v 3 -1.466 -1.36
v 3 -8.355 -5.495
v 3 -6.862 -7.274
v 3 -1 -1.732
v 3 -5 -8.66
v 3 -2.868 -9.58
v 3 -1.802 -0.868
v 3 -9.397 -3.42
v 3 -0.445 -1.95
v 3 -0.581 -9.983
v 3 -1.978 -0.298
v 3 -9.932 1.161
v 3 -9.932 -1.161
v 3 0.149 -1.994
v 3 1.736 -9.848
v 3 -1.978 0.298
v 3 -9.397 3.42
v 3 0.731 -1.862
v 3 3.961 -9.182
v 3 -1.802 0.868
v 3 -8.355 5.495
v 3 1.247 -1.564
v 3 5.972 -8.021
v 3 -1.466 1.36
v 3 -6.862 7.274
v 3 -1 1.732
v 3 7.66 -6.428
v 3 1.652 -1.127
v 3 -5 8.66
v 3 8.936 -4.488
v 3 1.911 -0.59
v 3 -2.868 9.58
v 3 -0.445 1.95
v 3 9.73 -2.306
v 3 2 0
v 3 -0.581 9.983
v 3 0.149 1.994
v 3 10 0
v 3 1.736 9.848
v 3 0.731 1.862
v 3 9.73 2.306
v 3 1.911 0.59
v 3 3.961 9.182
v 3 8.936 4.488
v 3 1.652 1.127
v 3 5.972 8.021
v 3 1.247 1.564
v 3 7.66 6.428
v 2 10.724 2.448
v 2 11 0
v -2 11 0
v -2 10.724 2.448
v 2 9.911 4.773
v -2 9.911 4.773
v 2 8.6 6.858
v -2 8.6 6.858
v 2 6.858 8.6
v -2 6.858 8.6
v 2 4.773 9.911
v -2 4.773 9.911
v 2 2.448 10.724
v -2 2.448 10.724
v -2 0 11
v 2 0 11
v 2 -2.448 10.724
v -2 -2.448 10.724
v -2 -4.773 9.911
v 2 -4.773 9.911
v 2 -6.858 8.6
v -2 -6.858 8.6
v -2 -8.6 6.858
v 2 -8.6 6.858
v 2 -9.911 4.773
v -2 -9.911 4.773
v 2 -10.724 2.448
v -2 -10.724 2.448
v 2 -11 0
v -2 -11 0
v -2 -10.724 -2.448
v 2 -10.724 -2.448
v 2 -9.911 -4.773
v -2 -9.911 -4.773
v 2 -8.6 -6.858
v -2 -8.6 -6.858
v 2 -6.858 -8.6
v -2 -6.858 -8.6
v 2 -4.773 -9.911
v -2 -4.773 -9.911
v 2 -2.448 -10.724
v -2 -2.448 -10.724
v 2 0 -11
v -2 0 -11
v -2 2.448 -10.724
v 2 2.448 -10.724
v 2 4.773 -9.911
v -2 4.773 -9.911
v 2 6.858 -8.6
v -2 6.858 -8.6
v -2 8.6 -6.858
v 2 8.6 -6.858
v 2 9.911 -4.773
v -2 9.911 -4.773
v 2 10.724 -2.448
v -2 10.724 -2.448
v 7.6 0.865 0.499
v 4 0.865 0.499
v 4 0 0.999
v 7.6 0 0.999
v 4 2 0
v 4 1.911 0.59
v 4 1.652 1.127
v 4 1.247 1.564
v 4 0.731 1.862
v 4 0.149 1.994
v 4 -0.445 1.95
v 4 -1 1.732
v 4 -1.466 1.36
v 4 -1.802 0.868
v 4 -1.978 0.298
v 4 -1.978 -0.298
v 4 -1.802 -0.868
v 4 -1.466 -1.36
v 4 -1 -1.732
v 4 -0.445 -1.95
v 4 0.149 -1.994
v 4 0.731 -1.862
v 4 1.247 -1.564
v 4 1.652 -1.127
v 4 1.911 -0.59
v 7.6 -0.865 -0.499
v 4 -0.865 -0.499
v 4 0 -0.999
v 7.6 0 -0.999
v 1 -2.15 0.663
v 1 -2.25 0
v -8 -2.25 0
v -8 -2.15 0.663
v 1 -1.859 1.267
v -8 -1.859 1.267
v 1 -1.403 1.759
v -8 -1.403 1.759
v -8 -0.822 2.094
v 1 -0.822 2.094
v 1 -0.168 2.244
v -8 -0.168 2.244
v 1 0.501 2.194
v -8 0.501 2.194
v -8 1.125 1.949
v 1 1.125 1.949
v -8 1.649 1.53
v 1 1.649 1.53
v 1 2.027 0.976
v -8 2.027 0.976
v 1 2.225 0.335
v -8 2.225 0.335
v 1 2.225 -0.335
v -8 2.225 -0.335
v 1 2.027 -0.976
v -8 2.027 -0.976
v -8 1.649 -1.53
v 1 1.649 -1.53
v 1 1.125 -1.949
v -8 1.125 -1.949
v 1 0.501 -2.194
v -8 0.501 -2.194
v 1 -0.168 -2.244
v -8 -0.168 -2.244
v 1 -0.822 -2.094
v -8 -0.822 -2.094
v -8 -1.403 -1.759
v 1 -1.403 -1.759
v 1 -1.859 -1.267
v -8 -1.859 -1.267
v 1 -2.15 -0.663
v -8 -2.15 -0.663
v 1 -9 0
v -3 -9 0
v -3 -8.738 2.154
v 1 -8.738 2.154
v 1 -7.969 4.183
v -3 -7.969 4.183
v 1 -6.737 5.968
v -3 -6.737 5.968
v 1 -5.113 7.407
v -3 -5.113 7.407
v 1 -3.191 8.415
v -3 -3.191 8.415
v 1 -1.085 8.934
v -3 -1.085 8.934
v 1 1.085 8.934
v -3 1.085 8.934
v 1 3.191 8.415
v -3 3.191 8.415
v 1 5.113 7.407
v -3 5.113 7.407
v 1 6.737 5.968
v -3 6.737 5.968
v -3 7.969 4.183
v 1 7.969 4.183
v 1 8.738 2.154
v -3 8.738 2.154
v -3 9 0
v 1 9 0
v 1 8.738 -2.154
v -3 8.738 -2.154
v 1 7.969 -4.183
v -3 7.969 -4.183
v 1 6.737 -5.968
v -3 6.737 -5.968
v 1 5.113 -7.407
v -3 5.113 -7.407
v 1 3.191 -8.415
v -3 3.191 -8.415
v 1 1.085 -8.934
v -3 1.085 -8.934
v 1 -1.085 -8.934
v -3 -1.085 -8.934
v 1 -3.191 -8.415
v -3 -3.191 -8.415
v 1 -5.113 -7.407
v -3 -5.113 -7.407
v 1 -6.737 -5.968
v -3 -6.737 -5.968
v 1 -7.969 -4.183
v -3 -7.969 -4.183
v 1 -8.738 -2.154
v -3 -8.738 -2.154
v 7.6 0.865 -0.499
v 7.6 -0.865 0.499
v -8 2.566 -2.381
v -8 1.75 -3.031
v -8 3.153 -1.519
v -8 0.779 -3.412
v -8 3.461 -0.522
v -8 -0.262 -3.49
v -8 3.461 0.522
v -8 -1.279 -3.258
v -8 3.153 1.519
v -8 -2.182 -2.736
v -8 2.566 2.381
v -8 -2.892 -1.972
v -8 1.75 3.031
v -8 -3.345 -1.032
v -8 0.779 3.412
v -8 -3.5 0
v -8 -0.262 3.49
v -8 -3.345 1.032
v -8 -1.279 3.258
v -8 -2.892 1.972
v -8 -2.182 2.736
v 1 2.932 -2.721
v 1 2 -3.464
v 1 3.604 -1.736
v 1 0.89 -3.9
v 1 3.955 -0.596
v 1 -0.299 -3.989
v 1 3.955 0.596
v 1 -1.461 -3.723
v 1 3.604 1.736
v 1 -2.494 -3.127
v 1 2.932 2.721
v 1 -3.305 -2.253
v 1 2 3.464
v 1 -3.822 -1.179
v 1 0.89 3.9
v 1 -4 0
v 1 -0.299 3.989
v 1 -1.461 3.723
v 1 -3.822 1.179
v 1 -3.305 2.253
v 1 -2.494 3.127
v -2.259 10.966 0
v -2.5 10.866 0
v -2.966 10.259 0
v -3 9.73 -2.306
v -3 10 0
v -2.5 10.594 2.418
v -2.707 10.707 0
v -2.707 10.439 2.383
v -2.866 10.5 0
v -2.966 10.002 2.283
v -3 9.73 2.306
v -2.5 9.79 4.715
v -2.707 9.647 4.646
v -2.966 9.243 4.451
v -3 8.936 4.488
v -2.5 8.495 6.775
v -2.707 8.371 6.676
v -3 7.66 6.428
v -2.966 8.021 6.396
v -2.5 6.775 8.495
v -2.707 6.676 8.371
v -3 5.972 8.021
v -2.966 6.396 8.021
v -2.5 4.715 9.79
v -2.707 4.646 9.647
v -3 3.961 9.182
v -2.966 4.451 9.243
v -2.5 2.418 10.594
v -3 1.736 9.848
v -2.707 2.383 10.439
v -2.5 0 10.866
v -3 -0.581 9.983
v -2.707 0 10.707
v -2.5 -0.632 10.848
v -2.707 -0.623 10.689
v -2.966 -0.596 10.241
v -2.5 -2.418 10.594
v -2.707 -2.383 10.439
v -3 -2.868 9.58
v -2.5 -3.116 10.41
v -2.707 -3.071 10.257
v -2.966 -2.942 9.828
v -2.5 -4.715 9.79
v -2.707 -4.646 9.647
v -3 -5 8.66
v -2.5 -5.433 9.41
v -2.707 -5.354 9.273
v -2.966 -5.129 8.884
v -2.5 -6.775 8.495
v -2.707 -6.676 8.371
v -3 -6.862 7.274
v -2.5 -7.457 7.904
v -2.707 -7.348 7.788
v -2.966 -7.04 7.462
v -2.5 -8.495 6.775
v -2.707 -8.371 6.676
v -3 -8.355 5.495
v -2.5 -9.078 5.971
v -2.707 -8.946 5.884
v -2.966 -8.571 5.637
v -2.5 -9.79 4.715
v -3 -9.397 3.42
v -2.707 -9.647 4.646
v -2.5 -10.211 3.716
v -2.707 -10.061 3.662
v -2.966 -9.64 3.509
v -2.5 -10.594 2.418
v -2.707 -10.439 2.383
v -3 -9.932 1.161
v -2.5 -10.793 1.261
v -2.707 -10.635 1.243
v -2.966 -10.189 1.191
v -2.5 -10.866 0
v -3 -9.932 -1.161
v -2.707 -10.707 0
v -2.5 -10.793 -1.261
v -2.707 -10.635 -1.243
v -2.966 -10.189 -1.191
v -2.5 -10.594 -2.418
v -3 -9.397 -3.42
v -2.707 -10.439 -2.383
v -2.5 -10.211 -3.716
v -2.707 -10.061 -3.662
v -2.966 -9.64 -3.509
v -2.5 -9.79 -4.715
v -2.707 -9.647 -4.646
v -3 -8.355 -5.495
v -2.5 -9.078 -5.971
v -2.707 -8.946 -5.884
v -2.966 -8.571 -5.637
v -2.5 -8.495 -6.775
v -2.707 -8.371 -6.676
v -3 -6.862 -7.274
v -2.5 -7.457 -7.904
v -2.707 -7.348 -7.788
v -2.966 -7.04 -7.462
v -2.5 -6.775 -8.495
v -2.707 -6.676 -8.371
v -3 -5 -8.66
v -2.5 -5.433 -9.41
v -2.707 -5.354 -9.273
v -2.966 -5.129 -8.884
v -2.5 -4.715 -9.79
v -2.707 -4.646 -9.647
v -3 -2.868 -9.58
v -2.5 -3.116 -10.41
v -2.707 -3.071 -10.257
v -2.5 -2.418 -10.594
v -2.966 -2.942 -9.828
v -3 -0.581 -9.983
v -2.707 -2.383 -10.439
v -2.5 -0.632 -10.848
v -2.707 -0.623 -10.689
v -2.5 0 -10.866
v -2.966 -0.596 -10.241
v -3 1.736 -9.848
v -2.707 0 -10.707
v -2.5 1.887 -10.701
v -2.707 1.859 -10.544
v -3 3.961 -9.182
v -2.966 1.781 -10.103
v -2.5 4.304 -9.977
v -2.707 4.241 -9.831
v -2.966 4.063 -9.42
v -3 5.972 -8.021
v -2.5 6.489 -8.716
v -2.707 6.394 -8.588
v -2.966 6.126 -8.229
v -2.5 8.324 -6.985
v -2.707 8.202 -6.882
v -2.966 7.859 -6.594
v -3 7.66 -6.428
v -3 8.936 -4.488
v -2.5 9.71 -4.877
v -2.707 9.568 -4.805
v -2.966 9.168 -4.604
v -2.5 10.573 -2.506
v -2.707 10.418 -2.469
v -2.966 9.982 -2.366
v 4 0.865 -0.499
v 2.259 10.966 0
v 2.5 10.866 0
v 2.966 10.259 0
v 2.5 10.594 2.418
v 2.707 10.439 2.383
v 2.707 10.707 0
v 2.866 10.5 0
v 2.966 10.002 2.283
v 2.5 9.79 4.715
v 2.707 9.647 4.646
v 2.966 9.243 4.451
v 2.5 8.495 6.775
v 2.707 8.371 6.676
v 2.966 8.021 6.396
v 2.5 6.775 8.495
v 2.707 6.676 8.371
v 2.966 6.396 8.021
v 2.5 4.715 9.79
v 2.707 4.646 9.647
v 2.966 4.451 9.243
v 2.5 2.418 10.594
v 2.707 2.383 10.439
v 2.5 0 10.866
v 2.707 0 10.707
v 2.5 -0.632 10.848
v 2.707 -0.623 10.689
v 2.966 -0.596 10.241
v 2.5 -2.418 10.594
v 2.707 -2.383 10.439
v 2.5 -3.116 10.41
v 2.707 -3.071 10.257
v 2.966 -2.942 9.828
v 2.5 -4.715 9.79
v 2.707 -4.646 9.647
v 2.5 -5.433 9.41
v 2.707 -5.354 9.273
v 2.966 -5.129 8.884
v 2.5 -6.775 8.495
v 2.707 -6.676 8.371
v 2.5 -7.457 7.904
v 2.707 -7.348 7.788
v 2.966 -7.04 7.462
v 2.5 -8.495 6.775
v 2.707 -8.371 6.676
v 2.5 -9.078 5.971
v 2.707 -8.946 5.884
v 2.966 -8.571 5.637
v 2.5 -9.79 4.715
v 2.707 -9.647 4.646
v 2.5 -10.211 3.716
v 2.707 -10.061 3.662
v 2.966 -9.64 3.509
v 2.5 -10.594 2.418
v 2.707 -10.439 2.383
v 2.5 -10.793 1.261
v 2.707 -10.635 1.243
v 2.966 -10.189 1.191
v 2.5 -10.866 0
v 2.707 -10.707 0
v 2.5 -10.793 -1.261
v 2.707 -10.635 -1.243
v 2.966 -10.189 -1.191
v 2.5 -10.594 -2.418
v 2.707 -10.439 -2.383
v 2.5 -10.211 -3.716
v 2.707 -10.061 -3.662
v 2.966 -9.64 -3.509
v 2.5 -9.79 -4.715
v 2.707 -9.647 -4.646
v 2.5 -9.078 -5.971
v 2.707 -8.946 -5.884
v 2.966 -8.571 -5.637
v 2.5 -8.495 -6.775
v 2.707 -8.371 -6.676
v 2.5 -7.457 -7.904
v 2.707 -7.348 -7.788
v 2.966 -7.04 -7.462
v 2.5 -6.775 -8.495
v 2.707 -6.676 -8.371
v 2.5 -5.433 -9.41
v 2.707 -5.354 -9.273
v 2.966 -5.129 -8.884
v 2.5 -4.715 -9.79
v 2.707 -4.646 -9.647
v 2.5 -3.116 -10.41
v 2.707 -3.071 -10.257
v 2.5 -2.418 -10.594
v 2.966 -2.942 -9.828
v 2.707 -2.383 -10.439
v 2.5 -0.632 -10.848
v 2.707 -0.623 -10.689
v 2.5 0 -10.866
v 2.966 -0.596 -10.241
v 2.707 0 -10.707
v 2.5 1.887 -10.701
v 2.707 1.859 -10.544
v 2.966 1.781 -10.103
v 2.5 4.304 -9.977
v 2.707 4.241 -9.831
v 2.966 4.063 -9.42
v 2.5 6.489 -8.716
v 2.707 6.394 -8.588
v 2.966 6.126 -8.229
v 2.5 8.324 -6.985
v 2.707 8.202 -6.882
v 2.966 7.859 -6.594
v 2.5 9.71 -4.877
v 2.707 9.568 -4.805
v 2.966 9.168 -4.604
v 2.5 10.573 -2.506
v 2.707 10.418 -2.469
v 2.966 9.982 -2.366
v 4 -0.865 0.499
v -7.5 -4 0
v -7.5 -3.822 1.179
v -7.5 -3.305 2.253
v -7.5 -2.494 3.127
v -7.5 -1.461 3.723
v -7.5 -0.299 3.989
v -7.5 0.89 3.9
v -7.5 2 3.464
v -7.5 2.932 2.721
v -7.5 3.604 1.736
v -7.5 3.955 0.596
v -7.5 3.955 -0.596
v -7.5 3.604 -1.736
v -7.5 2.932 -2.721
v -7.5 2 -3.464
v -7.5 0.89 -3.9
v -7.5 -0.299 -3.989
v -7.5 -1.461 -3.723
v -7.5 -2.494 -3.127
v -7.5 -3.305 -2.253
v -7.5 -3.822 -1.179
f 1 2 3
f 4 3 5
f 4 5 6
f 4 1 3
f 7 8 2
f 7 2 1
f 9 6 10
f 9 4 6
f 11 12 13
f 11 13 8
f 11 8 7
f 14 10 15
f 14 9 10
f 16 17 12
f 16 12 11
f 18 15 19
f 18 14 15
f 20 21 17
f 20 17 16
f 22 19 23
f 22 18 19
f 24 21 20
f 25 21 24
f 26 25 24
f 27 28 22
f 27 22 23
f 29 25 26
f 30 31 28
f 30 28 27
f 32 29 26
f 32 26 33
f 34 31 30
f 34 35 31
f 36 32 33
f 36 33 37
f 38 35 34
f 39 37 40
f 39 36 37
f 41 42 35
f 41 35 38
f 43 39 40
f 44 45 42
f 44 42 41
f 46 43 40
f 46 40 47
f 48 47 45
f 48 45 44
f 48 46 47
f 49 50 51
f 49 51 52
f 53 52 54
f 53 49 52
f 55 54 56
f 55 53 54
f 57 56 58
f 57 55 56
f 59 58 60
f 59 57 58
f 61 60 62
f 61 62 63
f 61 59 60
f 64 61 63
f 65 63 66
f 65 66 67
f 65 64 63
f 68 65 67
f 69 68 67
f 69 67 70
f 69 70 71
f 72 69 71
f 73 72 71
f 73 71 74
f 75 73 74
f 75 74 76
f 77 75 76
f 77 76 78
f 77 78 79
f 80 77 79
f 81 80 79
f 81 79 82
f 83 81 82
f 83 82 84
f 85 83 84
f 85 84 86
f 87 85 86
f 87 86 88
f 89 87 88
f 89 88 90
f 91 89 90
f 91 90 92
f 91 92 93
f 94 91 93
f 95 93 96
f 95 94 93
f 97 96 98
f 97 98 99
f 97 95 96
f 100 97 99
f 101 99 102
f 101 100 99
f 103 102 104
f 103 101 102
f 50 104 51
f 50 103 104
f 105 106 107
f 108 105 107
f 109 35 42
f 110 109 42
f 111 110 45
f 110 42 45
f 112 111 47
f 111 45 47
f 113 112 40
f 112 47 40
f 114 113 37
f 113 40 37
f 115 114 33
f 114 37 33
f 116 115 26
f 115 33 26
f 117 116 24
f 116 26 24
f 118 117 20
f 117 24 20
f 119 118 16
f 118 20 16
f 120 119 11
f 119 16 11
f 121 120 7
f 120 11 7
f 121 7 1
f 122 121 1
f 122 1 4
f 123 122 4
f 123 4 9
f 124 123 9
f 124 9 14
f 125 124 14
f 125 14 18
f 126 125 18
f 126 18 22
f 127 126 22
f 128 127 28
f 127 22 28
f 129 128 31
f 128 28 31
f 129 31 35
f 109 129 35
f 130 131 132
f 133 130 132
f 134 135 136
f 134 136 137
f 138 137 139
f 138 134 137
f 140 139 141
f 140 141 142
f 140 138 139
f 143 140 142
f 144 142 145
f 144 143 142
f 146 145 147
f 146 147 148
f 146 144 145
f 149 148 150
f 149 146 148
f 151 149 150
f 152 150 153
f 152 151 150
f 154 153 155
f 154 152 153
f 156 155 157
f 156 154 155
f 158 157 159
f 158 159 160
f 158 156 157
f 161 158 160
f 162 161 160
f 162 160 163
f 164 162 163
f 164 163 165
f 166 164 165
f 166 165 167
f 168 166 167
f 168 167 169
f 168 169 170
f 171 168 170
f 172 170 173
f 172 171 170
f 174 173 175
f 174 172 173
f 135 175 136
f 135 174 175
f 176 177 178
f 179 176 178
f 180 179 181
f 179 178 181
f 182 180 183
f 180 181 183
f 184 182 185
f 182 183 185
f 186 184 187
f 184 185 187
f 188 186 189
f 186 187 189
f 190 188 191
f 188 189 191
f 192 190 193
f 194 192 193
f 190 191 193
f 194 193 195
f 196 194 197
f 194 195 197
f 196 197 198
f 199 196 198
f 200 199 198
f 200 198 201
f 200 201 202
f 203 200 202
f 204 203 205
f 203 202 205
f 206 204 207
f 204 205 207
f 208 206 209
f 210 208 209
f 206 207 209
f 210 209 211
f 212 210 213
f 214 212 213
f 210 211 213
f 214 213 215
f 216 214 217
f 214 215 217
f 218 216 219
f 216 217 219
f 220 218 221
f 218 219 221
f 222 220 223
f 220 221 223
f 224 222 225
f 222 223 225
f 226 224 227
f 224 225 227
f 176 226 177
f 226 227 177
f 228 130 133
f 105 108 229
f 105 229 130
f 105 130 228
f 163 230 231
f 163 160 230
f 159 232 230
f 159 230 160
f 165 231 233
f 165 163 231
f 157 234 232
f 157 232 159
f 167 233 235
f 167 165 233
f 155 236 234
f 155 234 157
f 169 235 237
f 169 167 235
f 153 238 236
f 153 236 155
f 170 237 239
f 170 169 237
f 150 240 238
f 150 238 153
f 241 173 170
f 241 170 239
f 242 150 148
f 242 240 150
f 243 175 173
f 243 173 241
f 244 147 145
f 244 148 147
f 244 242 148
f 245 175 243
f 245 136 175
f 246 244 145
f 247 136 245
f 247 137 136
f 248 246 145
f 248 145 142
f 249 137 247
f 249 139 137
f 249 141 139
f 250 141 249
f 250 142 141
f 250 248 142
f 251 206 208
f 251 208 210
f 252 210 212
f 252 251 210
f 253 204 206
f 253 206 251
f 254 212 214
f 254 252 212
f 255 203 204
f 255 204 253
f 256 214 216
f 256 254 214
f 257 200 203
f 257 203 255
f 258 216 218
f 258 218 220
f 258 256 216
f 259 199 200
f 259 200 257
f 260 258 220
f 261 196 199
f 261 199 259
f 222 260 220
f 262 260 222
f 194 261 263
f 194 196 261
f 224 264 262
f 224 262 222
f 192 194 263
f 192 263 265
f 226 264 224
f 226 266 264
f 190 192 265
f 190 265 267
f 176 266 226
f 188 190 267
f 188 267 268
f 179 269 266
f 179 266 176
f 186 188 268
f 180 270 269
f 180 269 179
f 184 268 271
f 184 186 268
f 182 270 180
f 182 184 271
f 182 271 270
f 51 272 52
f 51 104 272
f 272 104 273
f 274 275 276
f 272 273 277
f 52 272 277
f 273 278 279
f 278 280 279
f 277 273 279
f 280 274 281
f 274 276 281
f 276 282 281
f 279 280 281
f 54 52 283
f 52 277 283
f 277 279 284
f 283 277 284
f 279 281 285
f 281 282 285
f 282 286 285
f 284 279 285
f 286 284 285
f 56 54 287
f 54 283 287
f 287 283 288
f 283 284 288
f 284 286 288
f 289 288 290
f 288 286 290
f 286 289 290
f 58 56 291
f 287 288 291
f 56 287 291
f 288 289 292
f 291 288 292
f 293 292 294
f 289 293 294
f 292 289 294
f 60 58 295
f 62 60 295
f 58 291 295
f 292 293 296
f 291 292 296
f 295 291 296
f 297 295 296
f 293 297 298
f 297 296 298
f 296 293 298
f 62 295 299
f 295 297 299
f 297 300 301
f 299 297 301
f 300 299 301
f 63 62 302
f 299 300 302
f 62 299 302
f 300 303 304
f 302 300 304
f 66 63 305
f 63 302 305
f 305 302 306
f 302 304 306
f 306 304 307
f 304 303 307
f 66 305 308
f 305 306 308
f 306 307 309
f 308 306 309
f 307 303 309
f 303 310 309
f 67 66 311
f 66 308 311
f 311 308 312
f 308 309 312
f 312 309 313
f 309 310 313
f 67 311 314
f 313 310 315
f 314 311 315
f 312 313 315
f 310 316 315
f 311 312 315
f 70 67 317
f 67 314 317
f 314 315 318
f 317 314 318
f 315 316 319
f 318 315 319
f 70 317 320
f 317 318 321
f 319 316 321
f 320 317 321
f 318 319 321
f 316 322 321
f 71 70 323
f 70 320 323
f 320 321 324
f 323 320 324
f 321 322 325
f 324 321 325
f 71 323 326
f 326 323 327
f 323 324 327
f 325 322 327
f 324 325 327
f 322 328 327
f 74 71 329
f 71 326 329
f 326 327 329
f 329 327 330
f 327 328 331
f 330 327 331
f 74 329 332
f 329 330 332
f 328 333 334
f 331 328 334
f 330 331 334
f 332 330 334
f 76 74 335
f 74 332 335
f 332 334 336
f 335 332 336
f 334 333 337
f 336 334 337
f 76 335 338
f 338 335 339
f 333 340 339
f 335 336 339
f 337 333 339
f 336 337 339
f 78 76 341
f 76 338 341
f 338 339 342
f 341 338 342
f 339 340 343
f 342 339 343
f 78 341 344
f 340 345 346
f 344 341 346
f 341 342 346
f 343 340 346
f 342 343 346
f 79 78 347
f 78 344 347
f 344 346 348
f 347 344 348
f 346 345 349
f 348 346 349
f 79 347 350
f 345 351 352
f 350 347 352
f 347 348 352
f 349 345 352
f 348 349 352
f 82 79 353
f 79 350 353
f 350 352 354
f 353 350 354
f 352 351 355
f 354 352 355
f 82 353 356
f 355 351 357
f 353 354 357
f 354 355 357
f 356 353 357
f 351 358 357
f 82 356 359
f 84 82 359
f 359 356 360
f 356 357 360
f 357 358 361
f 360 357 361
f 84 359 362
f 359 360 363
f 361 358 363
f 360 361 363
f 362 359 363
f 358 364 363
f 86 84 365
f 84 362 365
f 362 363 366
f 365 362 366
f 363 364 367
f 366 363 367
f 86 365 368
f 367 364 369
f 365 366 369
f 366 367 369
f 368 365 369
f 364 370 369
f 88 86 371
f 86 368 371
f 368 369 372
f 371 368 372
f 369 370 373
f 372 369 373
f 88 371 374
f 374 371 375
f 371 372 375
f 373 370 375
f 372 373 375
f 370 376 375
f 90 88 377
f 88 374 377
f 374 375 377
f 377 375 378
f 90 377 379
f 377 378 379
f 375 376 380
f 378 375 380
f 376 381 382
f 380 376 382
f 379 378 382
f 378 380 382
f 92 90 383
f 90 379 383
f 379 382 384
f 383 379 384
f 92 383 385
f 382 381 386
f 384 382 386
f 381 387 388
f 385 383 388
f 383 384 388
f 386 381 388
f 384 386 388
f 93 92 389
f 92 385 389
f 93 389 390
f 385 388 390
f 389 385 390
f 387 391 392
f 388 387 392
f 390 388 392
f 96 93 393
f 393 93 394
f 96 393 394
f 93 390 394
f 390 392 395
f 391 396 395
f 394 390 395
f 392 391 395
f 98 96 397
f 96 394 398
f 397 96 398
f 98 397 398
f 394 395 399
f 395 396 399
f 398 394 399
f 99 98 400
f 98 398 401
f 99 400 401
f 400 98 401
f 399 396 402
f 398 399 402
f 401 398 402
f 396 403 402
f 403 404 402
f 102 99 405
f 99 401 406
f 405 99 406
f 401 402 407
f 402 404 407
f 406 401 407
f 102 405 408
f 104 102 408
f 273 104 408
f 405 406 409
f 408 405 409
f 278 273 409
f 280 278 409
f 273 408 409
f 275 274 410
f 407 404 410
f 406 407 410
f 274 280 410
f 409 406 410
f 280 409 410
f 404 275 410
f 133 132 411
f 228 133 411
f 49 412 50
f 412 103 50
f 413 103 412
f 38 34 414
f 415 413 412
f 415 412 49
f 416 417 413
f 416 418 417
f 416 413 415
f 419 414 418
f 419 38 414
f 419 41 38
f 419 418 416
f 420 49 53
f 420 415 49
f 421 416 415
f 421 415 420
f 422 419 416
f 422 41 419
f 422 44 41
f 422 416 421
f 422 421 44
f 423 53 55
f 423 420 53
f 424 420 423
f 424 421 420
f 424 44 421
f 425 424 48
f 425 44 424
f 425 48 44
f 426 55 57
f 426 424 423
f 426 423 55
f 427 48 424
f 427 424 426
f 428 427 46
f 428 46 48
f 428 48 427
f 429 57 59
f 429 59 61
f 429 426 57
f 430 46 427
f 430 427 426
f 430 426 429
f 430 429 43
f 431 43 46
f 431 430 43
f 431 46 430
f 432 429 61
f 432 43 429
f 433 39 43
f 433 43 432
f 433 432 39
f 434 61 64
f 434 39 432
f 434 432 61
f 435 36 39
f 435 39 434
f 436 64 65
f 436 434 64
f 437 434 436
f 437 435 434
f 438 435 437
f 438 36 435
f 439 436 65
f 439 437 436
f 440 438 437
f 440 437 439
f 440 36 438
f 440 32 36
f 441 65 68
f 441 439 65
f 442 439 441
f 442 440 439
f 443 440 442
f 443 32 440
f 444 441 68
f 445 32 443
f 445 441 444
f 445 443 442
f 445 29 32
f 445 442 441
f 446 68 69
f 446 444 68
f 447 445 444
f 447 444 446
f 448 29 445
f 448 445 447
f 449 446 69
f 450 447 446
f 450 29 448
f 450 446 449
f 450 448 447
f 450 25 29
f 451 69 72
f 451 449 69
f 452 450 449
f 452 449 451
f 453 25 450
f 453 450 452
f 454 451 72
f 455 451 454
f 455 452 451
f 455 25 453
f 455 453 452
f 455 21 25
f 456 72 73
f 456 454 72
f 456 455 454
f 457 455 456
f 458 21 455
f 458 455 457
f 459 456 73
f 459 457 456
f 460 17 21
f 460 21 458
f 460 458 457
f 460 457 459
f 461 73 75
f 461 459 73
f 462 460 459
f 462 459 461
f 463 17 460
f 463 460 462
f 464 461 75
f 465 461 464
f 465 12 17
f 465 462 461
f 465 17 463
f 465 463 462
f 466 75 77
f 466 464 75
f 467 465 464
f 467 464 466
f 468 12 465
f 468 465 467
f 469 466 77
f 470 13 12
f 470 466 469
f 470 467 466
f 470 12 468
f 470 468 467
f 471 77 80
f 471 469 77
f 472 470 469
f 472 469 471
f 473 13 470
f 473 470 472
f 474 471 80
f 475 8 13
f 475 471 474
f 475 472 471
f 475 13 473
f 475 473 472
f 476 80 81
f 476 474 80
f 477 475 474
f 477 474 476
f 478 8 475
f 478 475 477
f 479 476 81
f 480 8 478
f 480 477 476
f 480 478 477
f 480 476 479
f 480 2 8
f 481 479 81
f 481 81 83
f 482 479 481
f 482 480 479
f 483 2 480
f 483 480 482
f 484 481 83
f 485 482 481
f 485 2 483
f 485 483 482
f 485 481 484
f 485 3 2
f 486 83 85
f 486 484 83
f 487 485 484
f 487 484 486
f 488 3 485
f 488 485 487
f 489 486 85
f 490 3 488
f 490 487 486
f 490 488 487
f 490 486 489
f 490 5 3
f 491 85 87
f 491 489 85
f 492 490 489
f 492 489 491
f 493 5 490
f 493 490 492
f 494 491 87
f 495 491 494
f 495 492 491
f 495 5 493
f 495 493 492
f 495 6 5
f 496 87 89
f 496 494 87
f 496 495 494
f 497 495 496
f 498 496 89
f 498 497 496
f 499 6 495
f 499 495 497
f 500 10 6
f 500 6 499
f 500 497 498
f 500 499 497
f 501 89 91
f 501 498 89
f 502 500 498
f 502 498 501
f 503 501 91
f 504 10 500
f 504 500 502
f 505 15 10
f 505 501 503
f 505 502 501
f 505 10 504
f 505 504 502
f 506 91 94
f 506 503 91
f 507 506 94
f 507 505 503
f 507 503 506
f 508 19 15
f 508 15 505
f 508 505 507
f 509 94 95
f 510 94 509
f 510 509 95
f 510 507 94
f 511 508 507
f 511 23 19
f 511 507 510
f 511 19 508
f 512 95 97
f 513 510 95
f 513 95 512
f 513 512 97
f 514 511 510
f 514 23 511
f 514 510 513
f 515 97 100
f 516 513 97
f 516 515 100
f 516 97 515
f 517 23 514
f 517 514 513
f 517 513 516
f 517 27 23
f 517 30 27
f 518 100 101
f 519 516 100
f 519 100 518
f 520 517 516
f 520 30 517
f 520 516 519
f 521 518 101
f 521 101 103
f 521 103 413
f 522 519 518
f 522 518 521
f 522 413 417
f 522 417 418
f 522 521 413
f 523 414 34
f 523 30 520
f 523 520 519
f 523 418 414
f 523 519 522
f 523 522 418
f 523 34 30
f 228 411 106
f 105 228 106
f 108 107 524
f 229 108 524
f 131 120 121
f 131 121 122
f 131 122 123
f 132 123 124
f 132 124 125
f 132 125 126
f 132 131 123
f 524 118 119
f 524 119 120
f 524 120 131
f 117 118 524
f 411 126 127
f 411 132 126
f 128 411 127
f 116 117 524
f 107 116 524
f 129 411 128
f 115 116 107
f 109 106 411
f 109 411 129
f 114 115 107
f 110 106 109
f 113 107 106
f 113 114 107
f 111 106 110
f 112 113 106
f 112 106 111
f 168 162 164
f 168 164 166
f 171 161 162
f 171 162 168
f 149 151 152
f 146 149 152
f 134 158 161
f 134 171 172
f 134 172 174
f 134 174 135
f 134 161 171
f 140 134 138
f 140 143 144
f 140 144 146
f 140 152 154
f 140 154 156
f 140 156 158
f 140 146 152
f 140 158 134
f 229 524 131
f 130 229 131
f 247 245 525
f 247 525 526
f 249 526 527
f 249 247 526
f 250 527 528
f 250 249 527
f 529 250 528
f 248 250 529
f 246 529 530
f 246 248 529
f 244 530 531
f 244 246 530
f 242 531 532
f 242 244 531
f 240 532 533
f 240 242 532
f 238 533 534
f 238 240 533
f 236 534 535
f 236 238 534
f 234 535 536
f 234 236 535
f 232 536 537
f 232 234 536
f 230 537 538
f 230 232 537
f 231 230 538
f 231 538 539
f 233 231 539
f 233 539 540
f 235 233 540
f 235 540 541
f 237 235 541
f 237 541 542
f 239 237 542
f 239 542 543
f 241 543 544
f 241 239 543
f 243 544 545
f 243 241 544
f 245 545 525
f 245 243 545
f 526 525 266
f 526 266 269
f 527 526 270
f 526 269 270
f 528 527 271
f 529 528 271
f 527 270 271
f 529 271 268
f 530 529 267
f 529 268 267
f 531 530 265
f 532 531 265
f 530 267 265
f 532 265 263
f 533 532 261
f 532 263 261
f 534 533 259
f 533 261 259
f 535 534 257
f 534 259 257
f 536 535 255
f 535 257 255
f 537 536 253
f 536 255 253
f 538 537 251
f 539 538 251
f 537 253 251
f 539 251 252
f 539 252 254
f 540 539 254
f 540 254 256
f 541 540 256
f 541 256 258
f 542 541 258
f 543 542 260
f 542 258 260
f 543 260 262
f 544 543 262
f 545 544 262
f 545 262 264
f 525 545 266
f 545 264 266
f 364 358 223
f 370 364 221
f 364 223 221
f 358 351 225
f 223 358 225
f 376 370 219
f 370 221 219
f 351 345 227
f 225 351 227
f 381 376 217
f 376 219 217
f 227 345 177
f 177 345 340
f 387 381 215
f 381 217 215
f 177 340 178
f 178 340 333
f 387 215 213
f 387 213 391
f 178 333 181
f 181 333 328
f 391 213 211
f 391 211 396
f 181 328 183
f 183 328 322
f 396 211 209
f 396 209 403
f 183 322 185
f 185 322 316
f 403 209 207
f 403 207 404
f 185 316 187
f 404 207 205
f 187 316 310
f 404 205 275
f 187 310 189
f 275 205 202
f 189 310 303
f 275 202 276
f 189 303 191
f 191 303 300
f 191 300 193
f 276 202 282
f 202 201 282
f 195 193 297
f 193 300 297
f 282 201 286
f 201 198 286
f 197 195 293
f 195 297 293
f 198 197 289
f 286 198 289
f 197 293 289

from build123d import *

# Parameters (mm, degrees)
F0_R      = 11
F1_DEPTH  = 3
F2_R      = 1
F3_R      = 9
F4_DEPTH  = 4
F5_R      = 4
F5_R_2    = 2.25
F6_DEPTH  = 9
F7_R      = 2
F8_DEPTH  = 1
F10_DEPTH = 3.6
F11_SIZE  = 0.5


with BuildPart() as f1:
    # F0 (on Right) → F1 (new body, symmetric)
    with BuildSketch(Plane.YZ):
        Circle(F0_R)
    extrude(amount=F1_DEPTH, both=True)

    # F2
    f2_edges = [f1.edges().sort_by_distance(p)[0] for p in [
        (-3, -11, 0),
        (3, -11, 0),
    ]]
    fillet(f2_edges, radius=F2_R)

    # F3 (on face) → F4 (cut)
    with BuildSketch(Plane(origin=(-3, 0, 0), x_dir=(0, -1, 0), z_dir=(-1, 0, 0))):
        Circle(F3_R)
    extrude(amount=-F4_DEPTH, mode=Mode.SUBTRACT)

    # F5 (on face) → F6 (join)
    with BuildSketch(Plane(origin=(1, 0, 0), x_dir=(0, -1, 0), z_dir=(-1, 0, 0))):
        Circle(F5_R)
        Circle(F5_R_2, mode=Mode.SUBTRACT)
    extrude(amount=F6_DEPTH)

    # F7 (on face) → F8 (join)
    with BuildSketch(Plane.YZ.offset(3)):
        Circle(F7_R)
    extrude(amount=F8_DEPTH)

    # F9 (on face) → F10 (join)
    with BuildSketch(Plane.YZ.offset(4)):
        Polygon((0.865, -0.499408), (0.865, 0.499408), (0, 0.998816), (-0.865, 0.499408), (-0.865, -0.499408), (0, -0.998816), align=None)
    extrude(amount=F10_DEPTH)

    # F11
    f11_edges = [f1.edges().sort_by_distance(p)[0] for p in [
        (-8, 4, 0),
    ]]
    chamfer(f11_edges, length=F11_SIZE)


solid = f1.part
